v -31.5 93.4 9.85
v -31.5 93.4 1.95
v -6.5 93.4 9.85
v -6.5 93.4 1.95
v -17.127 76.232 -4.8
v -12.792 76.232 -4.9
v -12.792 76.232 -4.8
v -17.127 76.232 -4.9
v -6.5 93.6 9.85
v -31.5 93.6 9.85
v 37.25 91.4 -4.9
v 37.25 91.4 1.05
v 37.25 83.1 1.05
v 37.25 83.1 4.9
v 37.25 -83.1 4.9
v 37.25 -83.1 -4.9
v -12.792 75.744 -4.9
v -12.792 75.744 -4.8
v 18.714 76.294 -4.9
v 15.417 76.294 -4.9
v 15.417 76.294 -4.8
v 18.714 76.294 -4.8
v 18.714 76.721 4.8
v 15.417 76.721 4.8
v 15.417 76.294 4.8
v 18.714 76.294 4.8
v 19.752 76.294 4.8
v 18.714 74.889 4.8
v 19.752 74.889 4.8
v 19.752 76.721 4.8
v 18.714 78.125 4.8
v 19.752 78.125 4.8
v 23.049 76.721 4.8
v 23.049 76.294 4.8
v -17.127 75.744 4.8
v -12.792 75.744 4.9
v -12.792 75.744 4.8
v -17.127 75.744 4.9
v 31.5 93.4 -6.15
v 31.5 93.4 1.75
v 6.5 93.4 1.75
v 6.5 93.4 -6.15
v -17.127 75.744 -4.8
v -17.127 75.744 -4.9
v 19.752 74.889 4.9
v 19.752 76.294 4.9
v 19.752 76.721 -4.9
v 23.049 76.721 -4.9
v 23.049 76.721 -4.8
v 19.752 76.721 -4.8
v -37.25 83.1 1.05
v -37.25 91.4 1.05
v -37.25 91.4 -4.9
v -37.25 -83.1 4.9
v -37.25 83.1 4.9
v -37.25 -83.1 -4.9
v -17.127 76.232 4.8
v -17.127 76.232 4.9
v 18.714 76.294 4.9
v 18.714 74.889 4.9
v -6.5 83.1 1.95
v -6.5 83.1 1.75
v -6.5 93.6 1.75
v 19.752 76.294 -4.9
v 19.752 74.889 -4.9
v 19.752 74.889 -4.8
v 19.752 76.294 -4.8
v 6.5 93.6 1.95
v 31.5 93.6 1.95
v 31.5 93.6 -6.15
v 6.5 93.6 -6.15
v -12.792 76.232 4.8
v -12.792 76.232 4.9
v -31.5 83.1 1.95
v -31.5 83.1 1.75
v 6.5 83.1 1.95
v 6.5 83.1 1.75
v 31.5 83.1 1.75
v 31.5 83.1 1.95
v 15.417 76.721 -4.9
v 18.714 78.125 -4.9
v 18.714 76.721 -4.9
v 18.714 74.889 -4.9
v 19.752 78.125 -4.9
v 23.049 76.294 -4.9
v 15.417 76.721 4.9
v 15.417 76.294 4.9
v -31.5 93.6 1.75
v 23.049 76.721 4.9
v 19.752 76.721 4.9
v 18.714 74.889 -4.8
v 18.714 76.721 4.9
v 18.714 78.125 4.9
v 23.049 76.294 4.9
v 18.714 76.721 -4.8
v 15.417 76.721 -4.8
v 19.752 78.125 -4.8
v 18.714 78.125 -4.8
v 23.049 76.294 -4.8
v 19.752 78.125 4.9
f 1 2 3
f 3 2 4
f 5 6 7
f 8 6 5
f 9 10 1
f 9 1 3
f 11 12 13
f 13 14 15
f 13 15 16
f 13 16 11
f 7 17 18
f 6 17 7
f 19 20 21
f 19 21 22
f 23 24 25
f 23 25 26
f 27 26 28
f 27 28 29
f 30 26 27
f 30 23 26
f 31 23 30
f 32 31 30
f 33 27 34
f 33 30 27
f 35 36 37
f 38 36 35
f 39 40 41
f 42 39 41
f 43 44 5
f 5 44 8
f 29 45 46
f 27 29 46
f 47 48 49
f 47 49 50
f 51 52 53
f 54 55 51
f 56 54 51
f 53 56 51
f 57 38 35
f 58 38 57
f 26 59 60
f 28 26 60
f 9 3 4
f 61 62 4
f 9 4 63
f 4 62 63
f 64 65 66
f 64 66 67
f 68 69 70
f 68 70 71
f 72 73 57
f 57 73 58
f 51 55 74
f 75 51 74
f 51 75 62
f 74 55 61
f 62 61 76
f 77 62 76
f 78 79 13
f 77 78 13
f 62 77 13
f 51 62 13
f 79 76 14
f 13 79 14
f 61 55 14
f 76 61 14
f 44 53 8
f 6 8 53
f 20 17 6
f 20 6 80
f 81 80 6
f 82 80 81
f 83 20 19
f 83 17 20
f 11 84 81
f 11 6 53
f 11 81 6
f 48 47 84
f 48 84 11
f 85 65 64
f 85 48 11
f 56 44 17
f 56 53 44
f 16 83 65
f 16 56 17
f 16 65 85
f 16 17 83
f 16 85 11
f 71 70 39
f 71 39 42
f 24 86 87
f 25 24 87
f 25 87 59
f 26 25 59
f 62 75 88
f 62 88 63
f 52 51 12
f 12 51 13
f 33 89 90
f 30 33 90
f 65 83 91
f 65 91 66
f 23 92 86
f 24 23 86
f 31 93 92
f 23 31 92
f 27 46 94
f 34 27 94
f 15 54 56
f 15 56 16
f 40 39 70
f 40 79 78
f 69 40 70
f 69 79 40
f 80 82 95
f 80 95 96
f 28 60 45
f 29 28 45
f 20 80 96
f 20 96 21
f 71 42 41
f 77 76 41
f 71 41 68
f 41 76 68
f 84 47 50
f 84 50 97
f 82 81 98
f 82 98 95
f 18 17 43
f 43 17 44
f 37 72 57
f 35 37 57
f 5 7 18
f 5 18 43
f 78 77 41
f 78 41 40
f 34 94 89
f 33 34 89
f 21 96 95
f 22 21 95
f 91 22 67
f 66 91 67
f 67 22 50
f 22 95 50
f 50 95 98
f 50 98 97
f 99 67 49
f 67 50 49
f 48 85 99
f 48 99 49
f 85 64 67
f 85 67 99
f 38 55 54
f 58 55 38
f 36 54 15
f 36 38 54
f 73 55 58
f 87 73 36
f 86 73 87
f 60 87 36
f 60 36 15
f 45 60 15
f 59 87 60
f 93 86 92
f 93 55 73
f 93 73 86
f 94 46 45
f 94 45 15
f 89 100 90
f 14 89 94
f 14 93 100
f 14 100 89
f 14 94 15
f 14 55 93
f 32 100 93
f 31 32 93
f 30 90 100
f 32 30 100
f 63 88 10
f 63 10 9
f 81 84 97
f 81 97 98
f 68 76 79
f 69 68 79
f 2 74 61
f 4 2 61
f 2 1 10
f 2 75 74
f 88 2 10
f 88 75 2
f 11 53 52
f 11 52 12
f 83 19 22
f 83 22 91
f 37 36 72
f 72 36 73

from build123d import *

# Parameters (mm, degrees)
SKETCH_1_W          = 74.5
SKETCH_1_H          = 166.2
EXTRUDE_1_DEPTH     = 4.9
SKETCH_3_W          = 74.5
SKETCH_3_H          = 5.95
EXTRUDE_2_DEPTH     = 8.3
SKETCH_4_W          = 25
SKETCH_4_H          = 0.2
EXTRUDE_4_DEPTH     = 10.5
SKETCH_6_W          = 25
SKETCH_6_H          = 0.2
EXTRUDE_5_DEPTH     = 7.9
SKETCH_7_W          = 25
SKETCH_7_H          = 0.2
EXTRUDE_6_DEPTH     = 7.9
SKETCH_8_W          = 4.335096154
SKETCH_8_H          = 0.488461538
CUT_EXTRUDE_1_DEPTH = 0.1


with BuildPart() as part:
    # 草图1 → 凸台-拉伸1 (new, symmetric)
    with BuildSketch(Plane.XY):
        Rectangle(SKETCH_1_W, SKETCH_1_H)
    extrude(amount=EXTRUDE_1_DEPTH, both=True)

    # 草图3 → 凸台-拉伸2 (add)
    with BuildSketch(Plane(origin=(0, 83.1, 0), x_dir=(1, 0, 0), z_dir=(0, 1, 0))):
        with Locations((0, 1.925)):
            Rectangle(SKETCH_3_W, SKETCH_3_H)
    extrude(amount=EXTRUDE_2_DEPTH)

    # 草图4 → 凸台-拉伸4 (add)
    with BuildSketch(Plane(origin=(0, 83.1, 0), x_dir=(1, 0, 0), z_dir=(0, 1, 0))):
        with Locations((-19, -1.85)):
            Rectangle(SKETCH_4_W, SKETCH_4_H)
        with Locations((19, -1.85)):
            Rectangle(SKETCH_4_W, SKETCH_4_H)
    extrude(amount=EXTRUDE_4_DEPTH)

    # 草图6 → 凸台-拉伸5 (add)
    with BuildSketch(Plane.XY.offset(1.95)):
        with Locations((-19, 93.5)):
            Rectangle(SKETCH_6_W, SKETCH_6_H)
    extrude(amount=EXTRUDE_5_DEPTH)

    # 草图7 → 凸台-拉伸6 (add)
    with BuildSketch(Plane(origin=(0, 0, 1.75), x_dir=(-1, 0, 0), z_dir=(0, 0, -1))):
        with Locations((-19, 93.5)):
            Rectangle(SKETCH_7_W, SKETCH_7_H)
    extrude(amount=EXTRUDE_6_DEPTH)

    # 草图8 → 切除-拉伸1 (cut)
    with BuildSketch(Plane(origin=(0, 0, -4.9), x_dir=(-1, 0, 0), z_dir=(0, 0, -1))):
        Polygon((-19.751628191, 76.72094721), (-19.751628191, 78.125274133), (-18.713647422, 78.125274133), (-18.713647422, 76.72094721), (-15.416532037, 76.72094721), (-15.416532037, 76.293543364), (-18.713647422, 76.293543364), (-18.713647422, 74.889216441), (-19.751628191, 74.889216441), (-19.751628191, 76.293543364), (-23.048743575, 76.293543364), (-23.048743575, 76.72094721), align=None)
        with Locations((14.959669886, 75.988254902)):
            Rectangle(SKETCH_8_W, SKETCH_8_H)
    cut_extrude_1 = extrude(amount=-CUT_EXTRUDE_1_DEPTH, mode=Mode.SUBTRACT)

    # 镜向1: 切除-拉伸1 across plane
    add(cut_extrude_1.mirror(Plane.XY), mode=Mode.SUBTRACT)


solid = part.part
